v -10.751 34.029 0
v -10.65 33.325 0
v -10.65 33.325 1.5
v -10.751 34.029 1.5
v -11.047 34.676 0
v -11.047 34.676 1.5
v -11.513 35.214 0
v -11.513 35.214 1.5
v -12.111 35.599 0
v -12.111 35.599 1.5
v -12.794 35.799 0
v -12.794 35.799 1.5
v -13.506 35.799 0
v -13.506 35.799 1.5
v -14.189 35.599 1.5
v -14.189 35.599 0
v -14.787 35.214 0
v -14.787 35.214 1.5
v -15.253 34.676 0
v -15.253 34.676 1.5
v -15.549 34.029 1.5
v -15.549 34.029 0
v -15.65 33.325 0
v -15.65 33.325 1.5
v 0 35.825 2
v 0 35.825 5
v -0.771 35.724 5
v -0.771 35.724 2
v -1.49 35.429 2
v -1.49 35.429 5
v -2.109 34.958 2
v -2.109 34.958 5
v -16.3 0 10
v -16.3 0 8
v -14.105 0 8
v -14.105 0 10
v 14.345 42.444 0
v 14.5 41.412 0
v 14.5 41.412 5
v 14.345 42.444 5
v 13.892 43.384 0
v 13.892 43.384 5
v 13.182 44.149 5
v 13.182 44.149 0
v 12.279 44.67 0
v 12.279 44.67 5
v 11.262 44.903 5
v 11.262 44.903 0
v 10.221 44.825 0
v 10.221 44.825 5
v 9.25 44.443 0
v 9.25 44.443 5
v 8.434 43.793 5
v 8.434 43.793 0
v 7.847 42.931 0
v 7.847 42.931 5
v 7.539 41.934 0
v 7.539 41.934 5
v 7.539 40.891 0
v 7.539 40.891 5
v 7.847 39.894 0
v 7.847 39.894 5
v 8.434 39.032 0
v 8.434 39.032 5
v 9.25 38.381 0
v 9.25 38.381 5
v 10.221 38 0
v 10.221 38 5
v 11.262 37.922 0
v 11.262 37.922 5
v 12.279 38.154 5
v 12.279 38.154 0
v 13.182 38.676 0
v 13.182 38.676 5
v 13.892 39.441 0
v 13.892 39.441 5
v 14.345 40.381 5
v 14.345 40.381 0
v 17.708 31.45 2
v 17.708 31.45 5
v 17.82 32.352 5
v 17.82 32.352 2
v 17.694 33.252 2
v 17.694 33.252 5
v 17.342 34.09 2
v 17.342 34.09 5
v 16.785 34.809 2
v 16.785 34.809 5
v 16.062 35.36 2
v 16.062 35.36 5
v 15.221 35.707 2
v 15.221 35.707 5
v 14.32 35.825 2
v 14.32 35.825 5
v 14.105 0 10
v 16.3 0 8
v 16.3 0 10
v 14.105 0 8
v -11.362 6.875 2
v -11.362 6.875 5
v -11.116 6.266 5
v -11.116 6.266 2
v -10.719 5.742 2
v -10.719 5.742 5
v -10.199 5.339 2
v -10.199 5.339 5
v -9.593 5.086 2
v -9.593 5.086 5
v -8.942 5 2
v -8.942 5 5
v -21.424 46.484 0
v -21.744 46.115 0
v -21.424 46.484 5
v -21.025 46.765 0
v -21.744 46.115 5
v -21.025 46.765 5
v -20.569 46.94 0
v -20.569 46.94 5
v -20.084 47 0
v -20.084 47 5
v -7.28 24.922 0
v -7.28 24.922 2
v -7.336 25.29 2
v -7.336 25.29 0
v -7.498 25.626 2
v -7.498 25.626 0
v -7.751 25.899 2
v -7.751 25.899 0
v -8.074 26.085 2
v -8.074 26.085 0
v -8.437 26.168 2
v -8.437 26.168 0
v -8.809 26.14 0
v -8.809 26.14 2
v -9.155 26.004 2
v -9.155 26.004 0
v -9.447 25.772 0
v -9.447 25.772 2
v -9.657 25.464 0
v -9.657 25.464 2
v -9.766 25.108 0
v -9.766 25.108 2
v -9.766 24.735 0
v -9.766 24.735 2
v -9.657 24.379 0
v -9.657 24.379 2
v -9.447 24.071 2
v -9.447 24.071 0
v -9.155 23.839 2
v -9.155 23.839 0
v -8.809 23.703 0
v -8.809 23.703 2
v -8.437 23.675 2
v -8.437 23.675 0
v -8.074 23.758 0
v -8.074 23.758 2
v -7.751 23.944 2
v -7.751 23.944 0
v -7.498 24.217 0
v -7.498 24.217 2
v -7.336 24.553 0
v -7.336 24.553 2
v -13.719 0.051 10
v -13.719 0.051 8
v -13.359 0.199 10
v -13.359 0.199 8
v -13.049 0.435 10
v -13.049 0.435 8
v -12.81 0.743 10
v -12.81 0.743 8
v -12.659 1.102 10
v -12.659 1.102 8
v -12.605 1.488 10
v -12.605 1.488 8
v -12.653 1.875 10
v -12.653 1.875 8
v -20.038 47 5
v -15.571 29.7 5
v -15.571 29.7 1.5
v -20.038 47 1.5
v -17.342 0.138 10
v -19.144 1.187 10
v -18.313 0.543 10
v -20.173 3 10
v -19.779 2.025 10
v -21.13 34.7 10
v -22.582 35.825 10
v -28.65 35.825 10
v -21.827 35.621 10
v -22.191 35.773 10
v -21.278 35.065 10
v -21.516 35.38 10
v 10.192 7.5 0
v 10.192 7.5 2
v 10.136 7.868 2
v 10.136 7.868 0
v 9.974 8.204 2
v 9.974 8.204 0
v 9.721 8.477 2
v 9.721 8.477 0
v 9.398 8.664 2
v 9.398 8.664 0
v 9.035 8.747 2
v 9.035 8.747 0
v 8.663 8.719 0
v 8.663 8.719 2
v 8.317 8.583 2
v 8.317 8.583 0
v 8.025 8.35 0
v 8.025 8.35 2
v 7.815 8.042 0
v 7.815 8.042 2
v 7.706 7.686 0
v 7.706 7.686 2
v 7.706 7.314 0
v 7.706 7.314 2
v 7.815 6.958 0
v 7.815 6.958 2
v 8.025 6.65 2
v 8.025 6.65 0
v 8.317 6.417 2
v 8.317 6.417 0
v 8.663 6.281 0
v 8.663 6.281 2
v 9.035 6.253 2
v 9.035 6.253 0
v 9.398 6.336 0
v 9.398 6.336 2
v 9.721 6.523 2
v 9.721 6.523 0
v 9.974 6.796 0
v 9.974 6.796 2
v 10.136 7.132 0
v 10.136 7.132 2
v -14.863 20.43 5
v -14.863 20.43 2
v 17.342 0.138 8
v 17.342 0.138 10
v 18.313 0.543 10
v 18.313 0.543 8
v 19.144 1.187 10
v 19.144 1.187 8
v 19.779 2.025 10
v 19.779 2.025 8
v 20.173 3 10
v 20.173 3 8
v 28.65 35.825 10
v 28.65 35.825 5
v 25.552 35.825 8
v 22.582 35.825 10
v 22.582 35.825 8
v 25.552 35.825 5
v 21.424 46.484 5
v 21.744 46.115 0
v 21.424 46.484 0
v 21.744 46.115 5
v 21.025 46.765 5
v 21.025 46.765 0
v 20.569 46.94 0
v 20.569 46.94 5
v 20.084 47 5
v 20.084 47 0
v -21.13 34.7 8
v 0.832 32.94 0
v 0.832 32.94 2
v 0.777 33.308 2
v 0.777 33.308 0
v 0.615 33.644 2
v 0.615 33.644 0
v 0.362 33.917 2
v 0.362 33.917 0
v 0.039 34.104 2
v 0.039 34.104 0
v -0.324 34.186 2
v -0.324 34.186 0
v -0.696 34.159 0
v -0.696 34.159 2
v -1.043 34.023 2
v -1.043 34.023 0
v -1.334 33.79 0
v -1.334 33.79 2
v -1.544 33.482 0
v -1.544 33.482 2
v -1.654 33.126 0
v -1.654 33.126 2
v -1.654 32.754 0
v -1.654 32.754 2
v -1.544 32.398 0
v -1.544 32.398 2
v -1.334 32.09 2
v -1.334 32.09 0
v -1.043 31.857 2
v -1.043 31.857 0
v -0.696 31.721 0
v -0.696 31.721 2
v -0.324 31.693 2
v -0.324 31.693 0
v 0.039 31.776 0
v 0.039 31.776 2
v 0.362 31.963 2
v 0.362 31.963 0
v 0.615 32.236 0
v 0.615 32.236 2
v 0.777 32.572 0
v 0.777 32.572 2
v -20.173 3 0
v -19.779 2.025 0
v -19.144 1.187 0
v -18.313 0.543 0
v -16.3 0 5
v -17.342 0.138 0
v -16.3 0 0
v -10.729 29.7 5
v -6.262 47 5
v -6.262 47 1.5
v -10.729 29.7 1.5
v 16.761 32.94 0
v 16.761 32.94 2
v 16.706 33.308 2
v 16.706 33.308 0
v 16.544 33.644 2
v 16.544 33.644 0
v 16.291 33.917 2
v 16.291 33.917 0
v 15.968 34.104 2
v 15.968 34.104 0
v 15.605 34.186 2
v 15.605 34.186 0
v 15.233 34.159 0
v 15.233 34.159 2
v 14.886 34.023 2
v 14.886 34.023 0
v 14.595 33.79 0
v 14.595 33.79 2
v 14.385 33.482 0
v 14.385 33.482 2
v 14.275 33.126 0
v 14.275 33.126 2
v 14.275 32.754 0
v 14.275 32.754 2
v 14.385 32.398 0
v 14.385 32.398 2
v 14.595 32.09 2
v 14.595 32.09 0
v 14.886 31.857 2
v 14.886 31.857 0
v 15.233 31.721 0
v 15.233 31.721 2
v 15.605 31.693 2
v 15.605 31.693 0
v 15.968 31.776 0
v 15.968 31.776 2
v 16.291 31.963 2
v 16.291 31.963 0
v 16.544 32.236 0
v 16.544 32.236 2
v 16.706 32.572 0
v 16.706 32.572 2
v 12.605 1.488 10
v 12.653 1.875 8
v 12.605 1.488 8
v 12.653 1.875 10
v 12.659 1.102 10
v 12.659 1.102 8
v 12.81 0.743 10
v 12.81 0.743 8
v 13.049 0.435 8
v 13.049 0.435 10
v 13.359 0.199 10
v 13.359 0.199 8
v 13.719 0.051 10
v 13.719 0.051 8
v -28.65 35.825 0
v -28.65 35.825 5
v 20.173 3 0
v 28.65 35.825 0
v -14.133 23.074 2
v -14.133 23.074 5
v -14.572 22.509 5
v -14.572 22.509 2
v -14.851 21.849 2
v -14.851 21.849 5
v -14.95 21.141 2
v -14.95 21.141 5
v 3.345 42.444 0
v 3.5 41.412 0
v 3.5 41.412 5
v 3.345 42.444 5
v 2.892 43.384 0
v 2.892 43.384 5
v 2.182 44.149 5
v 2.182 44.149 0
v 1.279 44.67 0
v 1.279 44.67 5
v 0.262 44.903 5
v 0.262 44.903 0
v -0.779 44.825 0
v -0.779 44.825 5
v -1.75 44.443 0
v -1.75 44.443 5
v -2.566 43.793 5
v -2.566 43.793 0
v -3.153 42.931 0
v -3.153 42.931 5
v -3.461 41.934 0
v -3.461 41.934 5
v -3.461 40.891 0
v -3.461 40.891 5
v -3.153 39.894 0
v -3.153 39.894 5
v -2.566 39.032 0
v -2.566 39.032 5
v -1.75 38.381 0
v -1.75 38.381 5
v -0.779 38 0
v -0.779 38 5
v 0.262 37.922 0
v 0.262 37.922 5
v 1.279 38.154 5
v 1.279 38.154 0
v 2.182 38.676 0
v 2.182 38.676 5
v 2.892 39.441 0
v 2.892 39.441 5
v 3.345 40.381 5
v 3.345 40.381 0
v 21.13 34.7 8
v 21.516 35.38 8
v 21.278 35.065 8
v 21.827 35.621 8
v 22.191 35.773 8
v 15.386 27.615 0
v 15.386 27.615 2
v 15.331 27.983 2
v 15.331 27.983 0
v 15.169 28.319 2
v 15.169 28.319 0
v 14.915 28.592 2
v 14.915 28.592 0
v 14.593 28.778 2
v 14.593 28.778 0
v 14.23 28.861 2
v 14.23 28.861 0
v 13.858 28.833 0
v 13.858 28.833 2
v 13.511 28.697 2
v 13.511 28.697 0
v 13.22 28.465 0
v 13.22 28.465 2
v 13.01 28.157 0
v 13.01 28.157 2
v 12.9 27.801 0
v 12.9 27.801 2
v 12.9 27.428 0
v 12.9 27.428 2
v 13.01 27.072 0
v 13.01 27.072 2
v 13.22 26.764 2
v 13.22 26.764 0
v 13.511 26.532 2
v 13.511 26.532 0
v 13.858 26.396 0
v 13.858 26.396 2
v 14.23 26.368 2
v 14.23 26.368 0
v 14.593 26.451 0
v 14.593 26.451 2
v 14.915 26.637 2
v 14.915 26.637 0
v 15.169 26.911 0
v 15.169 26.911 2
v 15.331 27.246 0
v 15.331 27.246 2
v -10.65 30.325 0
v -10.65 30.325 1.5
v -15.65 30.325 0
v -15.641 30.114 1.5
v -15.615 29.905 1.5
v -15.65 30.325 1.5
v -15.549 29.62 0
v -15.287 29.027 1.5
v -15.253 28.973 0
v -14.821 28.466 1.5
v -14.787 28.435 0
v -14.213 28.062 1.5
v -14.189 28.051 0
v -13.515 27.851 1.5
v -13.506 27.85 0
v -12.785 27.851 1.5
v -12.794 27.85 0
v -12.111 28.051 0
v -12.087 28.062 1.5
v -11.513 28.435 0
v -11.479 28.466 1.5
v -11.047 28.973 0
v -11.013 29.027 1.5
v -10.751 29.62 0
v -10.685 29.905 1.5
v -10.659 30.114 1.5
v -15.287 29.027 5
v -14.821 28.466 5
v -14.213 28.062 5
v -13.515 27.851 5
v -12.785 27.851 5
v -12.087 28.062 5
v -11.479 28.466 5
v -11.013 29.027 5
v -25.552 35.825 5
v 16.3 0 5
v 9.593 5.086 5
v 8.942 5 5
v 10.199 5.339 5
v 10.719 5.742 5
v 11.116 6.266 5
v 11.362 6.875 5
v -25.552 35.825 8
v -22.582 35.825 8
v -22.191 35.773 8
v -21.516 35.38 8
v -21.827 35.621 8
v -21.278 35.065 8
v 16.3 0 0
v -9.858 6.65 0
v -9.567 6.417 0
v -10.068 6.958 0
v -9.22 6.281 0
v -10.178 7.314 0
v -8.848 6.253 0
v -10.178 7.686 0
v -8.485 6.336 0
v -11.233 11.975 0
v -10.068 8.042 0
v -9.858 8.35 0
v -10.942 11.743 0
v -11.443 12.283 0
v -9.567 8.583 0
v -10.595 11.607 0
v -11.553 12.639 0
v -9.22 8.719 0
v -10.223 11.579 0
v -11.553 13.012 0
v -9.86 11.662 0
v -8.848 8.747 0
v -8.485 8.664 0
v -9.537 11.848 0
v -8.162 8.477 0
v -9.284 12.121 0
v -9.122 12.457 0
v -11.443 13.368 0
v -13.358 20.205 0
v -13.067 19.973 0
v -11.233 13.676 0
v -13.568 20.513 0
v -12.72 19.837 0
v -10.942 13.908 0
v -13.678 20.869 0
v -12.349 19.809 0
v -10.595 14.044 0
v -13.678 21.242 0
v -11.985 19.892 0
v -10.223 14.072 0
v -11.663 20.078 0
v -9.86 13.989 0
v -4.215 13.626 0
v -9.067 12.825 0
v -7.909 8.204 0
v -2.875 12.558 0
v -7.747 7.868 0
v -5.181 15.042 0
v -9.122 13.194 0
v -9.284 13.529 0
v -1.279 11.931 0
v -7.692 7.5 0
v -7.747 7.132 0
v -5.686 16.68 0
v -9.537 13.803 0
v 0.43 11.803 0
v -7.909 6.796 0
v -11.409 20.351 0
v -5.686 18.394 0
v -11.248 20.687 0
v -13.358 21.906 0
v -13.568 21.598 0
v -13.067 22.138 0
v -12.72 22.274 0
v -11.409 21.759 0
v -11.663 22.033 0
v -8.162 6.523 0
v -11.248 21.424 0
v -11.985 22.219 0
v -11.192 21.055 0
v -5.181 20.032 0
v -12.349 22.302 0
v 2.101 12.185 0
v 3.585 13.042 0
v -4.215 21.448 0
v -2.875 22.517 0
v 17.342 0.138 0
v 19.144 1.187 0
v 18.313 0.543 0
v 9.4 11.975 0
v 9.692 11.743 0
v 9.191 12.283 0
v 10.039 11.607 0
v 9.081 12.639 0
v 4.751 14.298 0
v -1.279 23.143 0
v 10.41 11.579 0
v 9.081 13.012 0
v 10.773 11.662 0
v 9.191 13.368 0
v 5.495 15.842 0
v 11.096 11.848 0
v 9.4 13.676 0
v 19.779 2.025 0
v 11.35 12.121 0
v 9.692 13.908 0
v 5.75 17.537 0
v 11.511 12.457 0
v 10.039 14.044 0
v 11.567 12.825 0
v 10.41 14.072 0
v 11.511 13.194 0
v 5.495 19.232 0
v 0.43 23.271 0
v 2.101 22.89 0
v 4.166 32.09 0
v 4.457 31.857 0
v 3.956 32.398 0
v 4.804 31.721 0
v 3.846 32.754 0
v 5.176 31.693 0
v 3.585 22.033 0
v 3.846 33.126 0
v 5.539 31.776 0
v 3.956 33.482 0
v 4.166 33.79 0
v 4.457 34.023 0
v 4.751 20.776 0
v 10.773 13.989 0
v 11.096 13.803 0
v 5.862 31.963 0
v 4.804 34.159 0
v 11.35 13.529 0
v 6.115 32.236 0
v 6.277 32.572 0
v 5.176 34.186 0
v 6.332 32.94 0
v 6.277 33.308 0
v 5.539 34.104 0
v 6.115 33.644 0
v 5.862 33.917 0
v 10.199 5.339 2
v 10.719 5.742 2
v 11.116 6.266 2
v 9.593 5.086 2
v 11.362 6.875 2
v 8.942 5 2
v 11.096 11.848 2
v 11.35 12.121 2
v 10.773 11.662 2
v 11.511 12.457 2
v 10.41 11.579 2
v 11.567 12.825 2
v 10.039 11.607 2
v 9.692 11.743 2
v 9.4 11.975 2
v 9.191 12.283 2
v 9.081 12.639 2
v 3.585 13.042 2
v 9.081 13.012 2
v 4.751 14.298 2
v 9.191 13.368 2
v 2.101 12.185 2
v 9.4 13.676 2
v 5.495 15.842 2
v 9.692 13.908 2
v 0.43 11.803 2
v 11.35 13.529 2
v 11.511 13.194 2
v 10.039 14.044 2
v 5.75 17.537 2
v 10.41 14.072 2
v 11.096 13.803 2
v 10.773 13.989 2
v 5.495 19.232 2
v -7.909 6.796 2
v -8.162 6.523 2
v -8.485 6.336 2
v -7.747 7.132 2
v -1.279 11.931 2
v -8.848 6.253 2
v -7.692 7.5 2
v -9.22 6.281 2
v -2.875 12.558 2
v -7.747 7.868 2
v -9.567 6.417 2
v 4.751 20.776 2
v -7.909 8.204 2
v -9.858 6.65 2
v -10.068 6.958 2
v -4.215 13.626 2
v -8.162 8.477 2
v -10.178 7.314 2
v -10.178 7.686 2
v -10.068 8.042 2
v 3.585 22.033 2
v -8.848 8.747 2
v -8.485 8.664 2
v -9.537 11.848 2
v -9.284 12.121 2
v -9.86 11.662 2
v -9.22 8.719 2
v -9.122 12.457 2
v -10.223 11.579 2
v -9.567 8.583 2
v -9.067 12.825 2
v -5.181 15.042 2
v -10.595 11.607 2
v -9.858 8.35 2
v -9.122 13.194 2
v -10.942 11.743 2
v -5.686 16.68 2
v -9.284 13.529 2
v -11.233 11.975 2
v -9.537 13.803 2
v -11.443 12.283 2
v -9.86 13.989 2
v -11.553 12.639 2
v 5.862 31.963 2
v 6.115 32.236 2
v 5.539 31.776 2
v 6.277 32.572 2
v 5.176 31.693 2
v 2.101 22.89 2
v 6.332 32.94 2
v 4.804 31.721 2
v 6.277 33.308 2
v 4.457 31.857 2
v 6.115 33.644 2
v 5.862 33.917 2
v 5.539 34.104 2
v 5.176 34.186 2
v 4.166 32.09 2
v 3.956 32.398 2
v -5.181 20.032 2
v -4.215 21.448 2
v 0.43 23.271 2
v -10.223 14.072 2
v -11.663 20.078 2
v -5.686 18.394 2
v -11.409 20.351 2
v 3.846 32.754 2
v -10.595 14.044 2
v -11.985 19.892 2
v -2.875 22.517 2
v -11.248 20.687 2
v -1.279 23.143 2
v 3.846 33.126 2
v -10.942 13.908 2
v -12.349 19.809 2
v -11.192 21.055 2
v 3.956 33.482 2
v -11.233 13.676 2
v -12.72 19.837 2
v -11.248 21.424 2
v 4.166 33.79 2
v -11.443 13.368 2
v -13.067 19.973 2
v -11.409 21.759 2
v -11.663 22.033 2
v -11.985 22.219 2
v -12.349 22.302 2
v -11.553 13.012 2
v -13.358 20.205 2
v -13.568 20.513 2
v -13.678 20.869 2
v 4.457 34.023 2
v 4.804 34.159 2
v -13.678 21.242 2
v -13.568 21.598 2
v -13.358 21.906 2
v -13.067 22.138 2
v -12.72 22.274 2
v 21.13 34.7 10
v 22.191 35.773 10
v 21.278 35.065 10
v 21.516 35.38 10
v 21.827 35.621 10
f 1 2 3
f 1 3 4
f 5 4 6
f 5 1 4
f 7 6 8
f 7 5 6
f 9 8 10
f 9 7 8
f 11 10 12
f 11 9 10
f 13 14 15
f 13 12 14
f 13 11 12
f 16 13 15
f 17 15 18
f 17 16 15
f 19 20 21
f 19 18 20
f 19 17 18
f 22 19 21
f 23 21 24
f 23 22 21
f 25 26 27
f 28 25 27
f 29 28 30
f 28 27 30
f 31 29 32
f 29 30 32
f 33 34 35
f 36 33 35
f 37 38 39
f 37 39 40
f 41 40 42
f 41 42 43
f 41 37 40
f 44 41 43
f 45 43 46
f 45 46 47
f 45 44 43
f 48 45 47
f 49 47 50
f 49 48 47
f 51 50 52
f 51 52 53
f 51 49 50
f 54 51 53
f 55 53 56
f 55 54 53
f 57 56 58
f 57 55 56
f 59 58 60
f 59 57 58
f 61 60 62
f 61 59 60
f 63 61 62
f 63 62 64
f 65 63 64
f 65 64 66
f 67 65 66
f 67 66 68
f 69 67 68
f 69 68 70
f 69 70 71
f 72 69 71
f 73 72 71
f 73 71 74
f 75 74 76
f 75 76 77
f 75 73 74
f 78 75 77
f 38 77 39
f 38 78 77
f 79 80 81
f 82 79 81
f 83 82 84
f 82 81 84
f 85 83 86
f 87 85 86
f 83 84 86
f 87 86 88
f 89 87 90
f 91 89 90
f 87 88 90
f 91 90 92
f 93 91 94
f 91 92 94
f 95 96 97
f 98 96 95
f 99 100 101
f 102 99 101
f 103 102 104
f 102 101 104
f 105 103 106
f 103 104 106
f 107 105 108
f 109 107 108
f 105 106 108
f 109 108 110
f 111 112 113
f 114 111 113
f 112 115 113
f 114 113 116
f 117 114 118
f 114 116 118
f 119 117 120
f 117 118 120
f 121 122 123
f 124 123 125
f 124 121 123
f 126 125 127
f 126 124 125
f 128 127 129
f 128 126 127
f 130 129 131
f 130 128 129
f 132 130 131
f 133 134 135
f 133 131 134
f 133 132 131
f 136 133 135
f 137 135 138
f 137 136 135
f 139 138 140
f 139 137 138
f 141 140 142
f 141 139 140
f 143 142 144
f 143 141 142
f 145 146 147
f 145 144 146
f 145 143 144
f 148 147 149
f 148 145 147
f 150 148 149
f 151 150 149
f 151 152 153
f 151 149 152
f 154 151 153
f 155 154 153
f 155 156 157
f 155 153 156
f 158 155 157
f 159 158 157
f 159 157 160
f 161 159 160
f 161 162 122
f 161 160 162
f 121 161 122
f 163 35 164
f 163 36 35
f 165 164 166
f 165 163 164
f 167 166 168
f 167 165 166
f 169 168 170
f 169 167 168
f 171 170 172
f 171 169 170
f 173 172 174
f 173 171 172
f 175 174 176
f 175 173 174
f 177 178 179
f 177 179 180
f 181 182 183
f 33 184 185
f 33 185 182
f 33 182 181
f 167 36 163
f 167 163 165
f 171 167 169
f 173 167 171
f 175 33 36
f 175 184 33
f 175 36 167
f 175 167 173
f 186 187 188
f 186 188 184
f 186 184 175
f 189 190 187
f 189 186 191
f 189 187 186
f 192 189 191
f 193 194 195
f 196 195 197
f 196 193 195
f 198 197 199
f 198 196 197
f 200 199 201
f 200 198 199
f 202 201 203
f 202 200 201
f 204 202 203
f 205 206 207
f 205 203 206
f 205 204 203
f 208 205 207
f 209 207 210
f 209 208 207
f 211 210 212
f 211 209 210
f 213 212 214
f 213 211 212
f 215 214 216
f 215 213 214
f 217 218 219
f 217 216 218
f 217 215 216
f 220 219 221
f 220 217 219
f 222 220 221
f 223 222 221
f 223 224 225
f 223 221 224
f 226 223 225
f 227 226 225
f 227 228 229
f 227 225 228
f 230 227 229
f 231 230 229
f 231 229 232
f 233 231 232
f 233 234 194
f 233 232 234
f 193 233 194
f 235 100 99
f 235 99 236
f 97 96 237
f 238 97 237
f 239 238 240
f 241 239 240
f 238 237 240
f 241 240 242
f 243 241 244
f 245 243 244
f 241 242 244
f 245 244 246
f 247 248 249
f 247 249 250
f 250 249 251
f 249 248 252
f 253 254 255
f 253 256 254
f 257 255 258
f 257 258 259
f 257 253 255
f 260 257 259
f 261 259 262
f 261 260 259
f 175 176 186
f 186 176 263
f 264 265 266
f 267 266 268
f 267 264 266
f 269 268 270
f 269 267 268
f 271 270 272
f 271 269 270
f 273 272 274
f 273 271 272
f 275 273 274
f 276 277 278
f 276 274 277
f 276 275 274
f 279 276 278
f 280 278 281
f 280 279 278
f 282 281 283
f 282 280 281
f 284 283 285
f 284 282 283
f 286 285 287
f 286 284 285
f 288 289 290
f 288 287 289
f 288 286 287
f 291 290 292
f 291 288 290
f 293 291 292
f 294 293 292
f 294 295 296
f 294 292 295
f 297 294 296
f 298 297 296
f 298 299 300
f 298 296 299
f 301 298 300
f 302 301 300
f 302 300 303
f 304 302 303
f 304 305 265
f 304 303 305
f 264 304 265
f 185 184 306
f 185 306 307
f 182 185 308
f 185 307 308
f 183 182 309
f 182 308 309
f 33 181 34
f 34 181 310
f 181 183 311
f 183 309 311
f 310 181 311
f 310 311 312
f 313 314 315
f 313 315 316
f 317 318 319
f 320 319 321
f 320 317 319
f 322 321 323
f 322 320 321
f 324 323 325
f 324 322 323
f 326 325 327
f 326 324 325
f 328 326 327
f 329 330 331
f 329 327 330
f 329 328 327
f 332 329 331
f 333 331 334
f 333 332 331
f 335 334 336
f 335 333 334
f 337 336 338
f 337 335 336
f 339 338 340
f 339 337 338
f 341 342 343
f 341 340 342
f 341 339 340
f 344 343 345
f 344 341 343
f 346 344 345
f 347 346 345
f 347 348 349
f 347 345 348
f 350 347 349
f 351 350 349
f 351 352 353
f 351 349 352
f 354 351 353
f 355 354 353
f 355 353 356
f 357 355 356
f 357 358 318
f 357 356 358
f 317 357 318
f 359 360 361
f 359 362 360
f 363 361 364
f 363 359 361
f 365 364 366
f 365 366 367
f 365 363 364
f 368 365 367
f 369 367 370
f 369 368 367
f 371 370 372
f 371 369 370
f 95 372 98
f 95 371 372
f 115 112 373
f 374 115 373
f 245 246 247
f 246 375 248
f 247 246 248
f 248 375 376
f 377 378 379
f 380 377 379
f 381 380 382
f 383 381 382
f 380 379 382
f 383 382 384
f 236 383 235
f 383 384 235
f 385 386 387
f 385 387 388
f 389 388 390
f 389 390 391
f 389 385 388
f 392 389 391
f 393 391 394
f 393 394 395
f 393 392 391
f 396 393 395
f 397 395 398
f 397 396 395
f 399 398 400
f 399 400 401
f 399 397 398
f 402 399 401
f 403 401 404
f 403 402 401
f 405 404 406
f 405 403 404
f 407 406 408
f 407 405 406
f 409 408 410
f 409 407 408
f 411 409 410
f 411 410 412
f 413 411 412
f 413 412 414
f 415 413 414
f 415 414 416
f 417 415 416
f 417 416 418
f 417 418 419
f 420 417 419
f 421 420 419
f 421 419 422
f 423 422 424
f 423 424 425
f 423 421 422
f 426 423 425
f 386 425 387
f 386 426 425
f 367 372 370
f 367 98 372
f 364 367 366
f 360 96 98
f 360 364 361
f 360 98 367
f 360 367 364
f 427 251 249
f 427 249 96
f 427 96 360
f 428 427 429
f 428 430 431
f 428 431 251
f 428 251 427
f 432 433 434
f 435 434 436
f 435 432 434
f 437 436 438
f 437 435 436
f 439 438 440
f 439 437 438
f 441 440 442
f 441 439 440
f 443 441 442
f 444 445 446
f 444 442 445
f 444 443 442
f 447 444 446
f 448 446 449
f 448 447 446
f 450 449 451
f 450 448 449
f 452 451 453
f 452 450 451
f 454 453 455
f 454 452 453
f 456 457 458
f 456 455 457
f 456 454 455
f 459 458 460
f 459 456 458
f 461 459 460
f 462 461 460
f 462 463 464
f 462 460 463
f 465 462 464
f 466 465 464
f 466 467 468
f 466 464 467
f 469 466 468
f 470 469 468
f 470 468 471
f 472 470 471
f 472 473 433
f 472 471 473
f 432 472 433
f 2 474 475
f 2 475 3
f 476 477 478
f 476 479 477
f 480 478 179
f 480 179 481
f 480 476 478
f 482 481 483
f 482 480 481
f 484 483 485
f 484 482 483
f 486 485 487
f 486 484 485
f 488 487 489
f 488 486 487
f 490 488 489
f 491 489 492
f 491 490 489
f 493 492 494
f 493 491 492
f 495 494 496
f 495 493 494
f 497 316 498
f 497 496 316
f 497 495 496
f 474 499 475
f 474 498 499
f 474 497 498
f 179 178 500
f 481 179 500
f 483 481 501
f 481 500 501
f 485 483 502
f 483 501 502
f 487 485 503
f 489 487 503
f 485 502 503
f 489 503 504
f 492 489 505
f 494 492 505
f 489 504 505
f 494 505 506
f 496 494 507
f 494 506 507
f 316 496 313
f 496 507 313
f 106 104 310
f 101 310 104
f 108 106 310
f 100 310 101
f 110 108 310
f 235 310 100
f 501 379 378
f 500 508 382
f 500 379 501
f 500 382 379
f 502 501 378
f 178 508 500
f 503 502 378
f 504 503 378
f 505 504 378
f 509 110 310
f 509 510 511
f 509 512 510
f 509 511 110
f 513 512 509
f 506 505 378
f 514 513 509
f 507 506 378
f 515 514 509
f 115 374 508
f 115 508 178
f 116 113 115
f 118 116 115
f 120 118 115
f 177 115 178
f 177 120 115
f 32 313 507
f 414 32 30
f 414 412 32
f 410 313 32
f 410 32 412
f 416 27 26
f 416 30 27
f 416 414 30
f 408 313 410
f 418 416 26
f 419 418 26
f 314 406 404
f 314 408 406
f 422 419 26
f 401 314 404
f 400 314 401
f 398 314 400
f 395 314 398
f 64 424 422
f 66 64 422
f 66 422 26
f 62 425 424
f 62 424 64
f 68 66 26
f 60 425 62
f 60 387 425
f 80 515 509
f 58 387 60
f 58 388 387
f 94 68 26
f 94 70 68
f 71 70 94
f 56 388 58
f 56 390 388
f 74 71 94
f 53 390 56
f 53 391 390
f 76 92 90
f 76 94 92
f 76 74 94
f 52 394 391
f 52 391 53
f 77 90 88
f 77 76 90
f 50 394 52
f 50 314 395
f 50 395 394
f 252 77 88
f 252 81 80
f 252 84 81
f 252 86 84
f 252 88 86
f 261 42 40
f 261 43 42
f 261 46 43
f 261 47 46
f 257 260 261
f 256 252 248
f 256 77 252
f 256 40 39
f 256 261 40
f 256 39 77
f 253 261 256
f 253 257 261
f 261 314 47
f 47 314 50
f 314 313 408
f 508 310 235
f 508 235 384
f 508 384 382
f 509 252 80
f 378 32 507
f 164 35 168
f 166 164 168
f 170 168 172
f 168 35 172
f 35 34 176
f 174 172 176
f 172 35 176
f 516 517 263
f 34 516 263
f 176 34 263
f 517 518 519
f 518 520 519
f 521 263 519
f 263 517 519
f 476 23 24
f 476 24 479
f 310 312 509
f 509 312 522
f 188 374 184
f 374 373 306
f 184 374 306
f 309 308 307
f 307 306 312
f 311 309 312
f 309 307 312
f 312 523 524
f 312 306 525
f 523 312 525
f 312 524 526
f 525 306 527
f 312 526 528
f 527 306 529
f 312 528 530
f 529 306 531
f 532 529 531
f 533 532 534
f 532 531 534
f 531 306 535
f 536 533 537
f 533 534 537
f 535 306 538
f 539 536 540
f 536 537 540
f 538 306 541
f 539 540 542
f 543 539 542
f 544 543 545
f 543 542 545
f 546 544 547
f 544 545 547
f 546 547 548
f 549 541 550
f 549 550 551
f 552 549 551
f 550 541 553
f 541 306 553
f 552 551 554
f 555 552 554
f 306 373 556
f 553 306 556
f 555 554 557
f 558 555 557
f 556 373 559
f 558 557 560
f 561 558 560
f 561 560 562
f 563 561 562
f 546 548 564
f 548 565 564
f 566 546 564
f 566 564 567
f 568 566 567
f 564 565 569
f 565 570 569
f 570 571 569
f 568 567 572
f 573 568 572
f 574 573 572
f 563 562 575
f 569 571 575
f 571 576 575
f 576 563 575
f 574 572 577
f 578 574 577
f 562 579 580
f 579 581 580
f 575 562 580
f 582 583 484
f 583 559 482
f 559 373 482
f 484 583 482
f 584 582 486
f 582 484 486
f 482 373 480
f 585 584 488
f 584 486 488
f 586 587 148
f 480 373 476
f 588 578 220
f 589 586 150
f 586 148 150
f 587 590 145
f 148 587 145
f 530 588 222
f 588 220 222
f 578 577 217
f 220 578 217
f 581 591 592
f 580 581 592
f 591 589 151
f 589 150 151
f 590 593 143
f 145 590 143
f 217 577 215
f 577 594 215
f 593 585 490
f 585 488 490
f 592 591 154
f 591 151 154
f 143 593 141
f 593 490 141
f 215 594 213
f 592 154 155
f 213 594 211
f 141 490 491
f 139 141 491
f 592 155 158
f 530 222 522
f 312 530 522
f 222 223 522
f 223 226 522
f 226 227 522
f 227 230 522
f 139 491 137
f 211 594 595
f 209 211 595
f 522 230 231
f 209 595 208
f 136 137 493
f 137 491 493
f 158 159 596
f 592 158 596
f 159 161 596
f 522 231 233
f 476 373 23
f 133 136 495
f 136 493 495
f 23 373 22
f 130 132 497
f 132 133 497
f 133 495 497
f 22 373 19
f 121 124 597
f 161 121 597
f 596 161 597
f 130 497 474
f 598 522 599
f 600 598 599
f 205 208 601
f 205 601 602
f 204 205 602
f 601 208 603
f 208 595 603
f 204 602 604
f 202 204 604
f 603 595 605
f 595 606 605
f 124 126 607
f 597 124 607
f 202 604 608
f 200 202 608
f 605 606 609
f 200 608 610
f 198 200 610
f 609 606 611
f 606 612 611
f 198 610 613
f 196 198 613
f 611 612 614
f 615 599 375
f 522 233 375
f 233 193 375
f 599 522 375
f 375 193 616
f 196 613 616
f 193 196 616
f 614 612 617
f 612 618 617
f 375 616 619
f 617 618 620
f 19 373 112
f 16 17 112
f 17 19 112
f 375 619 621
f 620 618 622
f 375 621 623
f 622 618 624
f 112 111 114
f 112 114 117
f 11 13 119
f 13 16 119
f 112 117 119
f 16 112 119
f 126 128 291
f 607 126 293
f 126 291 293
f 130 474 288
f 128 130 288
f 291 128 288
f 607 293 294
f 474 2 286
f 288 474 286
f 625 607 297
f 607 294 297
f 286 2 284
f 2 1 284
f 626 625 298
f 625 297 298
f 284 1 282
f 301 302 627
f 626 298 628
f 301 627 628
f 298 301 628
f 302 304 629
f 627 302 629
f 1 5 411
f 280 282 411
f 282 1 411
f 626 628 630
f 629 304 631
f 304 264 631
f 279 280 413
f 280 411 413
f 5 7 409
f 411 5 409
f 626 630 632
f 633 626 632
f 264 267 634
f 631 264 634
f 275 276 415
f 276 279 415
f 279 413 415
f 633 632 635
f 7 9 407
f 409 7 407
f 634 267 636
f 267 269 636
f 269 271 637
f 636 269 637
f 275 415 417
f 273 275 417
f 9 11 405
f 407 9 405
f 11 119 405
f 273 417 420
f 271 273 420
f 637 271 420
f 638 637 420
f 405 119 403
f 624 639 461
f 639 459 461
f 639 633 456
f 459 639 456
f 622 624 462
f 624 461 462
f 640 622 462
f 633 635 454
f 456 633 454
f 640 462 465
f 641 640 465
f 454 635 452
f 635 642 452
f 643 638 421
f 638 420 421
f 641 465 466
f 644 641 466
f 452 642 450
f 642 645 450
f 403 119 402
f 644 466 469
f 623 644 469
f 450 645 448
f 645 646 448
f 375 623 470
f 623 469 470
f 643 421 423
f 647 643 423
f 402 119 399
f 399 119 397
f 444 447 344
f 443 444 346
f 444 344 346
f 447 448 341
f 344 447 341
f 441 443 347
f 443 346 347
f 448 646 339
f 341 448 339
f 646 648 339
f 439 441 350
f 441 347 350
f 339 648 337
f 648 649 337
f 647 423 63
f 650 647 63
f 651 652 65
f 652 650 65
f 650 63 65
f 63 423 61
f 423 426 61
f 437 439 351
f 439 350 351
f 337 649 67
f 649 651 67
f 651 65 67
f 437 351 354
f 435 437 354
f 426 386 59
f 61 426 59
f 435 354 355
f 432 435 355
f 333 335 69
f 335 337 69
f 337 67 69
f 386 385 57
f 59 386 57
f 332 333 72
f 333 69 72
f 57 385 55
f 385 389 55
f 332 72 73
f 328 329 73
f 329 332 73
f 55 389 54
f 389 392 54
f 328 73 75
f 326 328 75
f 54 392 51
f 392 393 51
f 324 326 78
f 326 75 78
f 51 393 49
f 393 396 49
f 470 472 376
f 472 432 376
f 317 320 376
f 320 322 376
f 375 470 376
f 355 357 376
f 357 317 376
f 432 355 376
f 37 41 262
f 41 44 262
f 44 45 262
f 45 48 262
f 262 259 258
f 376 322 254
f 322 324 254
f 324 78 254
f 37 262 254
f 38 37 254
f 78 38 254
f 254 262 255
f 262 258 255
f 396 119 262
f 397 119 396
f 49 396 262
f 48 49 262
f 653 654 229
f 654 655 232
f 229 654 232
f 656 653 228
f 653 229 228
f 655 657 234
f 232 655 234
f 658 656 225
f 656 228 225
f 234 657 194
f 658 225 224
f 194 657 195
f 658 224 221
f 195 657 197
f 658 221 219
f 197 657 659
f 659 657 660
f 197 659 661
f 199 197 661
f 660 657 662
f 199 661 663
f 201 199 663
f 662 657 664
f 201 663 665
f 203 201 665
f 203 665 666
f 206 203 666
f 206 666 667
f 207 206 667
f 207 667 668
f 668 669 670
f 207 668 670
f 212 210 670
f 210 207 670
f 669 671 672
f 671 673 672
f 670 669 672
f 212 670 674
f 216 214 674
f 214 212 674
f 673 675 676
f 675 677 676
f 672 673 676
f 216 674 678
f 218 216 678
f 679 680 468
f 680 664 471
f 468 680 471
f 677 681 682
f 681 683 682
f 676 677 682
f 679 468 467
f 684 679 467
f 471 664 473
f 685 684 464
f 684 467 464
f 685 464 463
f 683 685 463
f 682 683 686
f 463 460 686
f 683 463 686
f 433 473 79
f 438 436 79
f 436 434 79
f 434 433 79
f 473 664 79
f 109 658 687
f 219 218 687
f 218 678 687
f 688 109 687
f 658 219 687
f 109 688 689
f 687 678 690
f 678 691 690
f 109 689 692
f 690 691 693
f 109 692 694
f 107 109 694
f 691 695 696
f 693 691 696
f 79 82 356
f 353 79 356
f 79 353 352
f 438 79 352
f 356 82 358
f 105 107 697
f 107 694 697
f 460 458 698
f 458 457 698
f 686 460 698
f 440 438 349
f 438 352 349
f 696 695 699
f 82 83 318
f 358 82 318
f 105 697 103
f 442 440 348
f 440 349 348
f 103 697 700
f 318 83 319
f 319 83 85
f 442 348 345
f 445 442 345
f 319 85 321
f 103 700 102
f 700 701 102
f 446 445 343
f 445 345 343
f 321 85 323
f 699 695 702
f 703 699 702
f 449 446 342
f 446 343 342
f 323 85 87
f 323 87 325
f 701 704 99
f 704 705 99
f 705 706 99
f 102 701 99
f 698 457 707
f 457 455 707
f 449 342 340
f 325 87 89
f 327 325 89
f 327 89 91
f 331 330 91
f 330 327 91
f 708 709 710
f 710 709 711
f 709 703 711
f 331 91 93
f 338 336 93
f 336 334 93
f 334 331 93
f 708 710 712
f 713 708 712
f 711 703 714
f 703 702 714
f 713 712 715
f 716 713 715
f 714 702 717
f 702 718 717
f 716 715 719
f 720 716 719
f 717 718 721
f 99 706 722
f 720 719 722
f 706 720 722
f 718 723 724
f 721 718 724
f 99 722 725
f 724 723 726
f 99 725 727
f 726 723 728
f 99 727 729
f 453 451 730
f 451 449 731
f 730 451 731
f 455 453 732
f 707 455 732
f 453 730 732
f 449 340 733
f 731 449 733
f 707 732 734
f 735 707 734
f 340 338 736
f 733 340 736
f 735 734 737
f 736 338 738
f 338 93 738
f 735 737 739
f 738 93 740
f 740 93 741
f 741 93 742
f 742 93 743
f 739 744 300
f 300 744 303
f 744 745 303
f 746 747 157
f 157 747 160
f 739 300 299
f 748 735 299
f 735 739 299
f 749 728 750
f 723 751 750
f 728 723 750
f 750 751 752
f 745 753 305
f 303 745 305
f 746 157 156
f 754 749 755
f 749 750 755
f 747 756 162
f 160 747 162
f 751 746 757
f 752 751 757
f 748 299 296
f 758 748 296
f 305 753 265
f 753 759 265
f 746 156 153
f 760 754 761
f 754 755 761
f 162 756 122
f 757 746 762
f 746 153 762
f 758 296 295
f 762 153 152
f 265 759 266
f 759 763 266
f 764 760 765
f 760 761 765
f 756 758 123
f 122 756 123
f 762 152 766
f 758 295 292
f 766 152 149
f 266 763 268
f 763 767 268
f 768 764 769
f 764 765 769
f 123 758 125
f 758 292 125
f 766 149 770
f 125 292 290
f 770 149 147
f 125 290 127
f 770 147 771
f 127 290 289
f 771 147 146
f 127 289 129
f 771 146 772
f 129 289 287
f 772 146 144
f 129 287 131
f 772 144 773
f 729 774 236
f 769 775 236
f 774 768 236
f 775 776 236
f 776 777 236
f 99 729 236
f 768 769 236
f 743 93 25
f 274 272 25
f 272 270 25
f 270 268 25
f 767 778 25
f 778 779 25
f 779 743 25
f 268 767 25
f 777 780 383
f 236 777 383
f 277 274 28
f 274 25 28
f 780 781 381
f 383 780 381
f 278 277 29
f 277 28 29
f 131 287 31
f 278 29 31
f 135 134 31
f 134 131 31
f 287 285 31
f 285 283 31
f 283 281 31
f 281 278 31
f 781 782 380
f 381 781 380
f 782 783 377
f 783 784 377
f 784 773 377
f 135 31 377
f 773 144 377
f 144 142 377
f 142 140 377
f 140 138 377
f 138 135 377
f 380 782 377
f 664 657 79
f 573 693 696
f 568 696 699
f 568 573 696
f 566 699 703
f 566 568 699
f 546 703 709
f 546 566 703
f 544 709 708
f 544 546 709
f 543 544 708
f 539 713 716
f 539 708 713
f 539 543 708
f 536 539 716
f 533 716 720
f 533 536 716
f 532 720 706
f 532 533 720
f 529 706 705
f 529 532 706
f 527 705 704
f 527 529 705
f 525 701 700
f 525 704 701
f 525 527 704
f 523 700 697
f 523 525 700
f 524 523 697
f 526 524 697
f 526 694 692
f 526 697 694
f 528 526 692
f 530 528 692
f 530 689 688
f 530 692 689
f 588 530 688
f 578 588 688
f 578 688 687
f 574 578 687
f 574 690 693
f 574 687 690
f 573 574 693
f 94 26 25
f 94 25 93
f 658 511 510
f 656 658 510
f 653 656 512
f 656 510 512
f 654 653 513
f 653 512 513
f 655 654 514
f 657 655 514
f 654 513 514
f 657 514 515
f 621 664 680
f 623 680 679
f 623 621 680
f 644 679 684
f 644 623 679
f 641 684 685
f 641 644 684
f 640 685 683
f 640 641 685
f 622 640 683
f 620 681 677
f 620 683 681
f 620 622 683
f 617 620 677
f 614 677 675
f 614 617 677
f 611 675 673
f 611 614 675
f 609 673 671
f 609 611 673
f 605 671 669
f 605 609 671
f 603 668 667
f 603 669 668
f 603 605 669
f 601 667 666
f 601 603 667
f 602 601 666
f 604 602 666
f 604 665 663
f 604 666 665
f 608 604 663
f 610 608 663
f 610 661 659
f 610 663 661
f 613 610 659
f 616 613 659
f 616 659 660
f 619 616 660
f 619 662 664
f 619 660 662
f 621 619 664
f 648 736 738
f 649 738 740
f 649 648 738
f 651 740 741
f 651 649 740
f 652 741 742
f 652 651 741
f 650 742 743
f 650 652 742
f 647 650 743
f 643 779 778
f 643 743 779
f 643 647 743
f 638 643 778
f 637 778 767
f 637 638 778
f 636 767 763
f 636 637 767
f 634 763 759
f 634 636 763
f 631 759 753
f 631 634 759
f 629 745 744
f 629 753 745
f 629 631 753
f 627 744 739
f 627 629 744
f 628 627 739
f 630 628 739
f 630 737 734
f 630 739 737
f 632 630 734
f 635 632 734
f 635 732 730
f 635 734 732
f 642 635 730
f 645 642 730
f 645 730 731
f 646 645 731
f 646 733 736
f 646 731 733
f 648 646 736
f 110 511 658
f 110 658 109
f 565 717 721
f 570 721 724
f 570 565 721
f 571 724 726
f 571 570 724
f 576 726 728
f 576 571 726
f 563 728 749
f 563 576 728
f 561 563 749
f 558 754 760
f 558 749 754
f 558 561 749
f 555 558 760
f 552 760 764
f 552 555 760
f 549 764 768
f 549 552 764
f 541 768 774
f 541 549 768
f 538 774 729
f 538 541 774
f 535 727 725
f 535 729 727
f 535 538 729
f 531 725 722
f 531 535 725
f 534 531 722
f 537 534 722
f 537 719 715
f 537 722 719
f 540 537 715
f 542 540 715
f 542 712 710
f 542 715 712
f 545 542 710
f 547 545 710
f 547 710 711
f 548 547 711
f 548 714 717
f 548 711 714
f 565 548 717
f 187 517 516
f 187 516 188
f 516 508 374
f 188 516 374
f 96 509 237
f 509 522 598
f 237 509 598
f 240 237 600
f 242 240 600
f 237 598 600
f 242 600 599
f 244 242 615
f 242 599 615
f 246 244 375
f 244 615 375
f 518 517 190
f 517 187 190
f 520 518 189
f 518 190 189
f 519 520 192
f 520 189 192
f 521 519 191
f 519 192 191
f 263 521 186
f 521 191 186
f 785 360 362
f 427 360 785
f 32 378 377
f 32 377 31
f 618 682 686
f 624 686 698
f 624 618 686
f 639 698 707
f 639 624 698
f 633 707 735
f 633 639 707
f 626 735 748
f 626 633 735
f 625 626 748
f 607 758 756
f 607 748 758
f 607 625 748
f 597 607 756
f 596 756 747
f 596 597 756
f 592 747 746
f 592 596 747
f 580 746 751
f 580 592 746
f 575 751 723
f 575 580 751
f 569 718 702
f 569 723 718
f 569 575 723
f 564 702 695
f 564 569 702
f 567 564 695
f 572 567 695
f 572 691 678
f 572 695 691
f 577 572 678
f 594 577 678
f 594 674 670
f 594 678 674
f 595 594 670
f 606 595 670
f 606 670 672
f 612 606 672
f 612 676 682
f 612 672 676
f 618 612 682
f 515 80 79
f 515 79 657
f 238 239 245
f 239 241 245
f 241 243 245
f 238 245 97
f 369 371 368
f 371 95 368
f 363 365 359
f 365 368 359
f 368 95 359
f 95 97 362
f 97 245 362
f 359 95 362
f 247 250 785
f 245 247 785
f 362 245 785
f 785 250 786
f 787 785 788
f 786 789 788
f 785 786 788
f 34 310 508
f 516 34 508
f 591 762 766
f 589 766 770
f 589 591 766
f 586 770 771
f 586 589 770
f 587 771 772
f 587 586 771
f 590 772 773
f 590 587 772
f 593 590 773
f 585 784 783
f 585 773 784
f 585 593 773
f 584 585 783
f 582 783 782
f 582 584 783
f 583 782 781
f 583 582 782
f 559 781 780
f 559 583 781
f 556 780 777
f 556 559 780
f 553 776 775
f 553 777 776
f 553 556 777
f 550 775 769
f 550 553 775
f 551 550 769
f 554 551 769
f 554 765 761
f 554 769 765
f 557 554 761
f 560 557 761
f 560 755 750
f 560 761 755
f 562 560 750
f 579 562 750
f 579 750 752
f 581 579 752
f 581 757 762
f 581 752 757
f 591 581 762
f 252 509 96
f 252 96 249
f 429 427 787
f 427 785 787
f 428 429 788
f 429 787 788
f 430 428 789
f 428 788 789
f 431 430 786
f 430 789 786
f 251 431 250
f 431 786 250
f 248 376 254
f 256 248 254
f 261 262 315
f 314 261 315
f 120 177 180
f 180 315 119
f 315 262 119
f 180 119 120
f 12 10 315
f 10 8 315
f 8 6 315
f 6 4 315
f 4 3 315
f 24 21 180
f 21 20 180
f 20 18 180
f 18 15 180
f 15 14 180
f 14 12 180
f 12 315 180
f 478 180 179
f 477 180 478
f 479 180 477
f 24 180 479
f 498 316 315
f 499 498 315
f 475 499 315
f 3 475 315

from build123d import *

# Parameters (mm, degrees)
SKETCH001_R     = 5.75
SKETCH001_R_2   = 3.5
SKETCH001_R_3   = 1.25
PAD_DEPTH       = 5
PAD001_DEPTH    = 8
PAD002_DEPTH    = 2
FILLET_R        = 1.5
POCKET_DEPTH    = 3
POCKET001_DEPTH = 3.5
FILLET001_R     = 2


with BuildPart() as part:
    # Sketch001 → Pad (new body)
    with BuildSketch(Plane.XY):
        with BuildLine():
            Line((-21.15, 47), (-28.65, 35.824688))
            Line((-28.65, 35.824688), (-20.173115, 2.999829))
            ThreePointArc((-20.173115, 2.999829), (-18.749596, 0.837668), (-16.300176, 0))
            Line((-16.300176, 0), (16.300176, 0))
            ThreePointArc((16.300176, 0), (18.749596, 0.837668), (20.173115, 2.999829))
            Line((20.173115, 2.999829), (28.65, 35.824688))
            Line((28.65, 35.824688), (21.15, 47))
            Line((21.15, 47), (-21.15, 47))
        make_face()
        with Locations((0, 17.53728)):
            Circle(SKETCH001_R, mode=Mode.SUBTRACT)
        with Locations((0, 41.412344)):
            Circle(SKETCH001_R_2, mode=Mode.SUBTRACT)
        with Locations((11, 41.412344)):
            Circle(SKETCH001_R_2, mode=Mode.SUBTRACT)
        with Locations((-8.941578, 7.5)):
            Circle(SKETCH001_R_3, mode=Mode.SUBTRACT)
        with Locations((-10.316813, 12.825292)):
            Circle(SKETCH001_R_3, mode=Mode.SUBTRACT)
        with Locations((-12.442175, 21.055288)):
            Circle(SKETCH001_R_3, mode=Mode.SUBTRACT)
        with Locations((-8.530434, 24.921588)):
            Circle(SKETCH001_R_3, mode=Mode.SUBTRACT)
        with Locations((8.941578, 7.5)):
            Circle(SKETCH001_R_3, mode=Mode.SUBTRACT)
        with Locations((10.316813, 12.825292)):
            Circle(SKETCH001_R_3, mode=Mode.SUBTRACT)
        with Locations((14.136115, 27.614693)):
            Circle(SKETCH001_R_3, mode=Mode.SUBTRACT)
        with Locations((15.511349, 32.939984)):
            Circle(SKETCH001_R_3, mode=Mode.SUBTRACT)
        with Locations((5.0822, 32.939984)):
            Circle(SKETCH001_R_3, mode=Mode.SUBTRACT)
        with Locations((-0.4178, 32.939984)):
            Circle(SKETCH001_R_3, mode=Mode.SUBTRACT)
        with BuildLine():
            ThreePointArc((-10.65, 33.324688), (-13.15, 35.824688), (-15.65, 33.324688))
            Line((-15.65, 33.324688), (-15.65, 30.324688))
            ThreePointArc((-15.65, 30.324688), (-13.15, 27.824688), (-10.65, 30.324688))
            Line((-10.65, 30.324688), (-10.65, 33.324688))
        make_face(mode=Mode.SUBTRACT)
    extrude(amount=PAD_DEPTH)

    # Sketch002 → Pad001 (join)
    with BuildSketch(Plane.XY):
        with BuildLine():
            Line((-25.551578, 35.824688), (-28.65, 35.824688))
            Line((-28.65, 35.824688), (-20.173115, 2.999829))
            ThreePointArc((-20.173115, 2.999829), (-18.749596, 0.837668), (-16.300176, 0))
            Line((-16.300176, 0), (-25.551578, 35.824688))
        make_face()
        with BuildLine():
            Line((28.65, 35.824688), (25.551578, 35.824688))
            Line((16.3, 0), (25.551578, 35.824688))
            ThreePointArc((16.3, 0), (18.749527, 0.837614), (20.173115, 2.999829))
            Line((28.65, 35.824688), (20.173115, 2.999829))
        make_face()
    extrude(amount=PAD001_DEPTH)

    # Sketch003 → Pad002 (join)
    with BuildSketch(Plane.XY.offset(8)):
        with BuildLine():
            Line((-16.300176, 0), (-12.168771, 0))
            Line((-12.168771, 0), (-21.420349, 35.824688))
            Line((-21.420349, 35.824688), (-28.65, 35.824688))
            Line((-28.65, 35.824688), (-20.173115, 2.999829))
            ThreePointArc((-20.173115, 2.999829), (-18.749596, 0.837668), (-16.300176, 0))
        make_face()
        with BuildLine():
            Line((16.300176, 0), (12.168771, 0))
            Line((12.168771, 0), (21.420349, 35.824688))
            Line((21.420349, 35.824688), (28.65, 35.824688))
            Line((28.65, 35.824688), (20.173115, 2.999829))
            ThreePointArc((16.300176, 0), (18.749596, 0.837668), (20.173115, 2.999829))
        make_face()
    extrude(amount=PAD002_DEPTH)

    # Fillet
    fillet_edges = [part.edges().sort_by_distance(p)[0] for p in [
        (-12.168771, 0, 9),
        (12.168771, 0, 9),
        (-21.420349, 35.824688, 9),
        (21.420349, 35.824688, 9),
    ]]
    fillet(fillet_edges, radius=FILLET_R)

    # Sketch004 (on DatumPlane) → Pocket (cut)
    with BuildSketch(Plane.XY.offset(5)):
        with BuildLine():
            Line((-11.362165, 6.874893), (-14.862762, 20.430181))
            ThreePointArc((-14.133267, 23.073669), (-14.85103, 21.849343), (-14.862762, 20.430181))
            Line((-14.133267, 23.073669), (-2.108891, 34.958365))
            ThreePointArc((0, 35.824688), (-1.139949, 35.599669), (-2.108891, 34.958365))
            Line((0, 35.824688), (14.319644, 35.824688))
            ThreePointArc((17.708466, 31.449539), (17.086685, 34.467931), (14.319644, 35.824688))
            Line((17.708466, 31.449539), (11.362165, 6.874893))
            ThreePointArc((8.941578, 5), (10.472466, 5.523543), (11.362165, 6.874893))
            Line((8.941578, 5), (-8.941578, 5))
            ThreePointArc((-11.362165, 6.874893), (-10.472466, 5.523543), (-8.941578, 5))
        make_face()
    extrude(amount=-POCKET_DEPTH, mode=Mode.SUBTRACT)

    # Sketch005 (on DatumPlane) → Pocket001 (cut)
    with BuildSketch(Plane.XY.offset(5)):
        with BuildLine():
            Line((-6.261651, 47), (-10.729413, 29.699582))
            ThreePointArc((-15.570587, 29.699582), (-13.15, 27.824688), (-10.729413, 29.699582))
            Line((-15.570587, 29.699582), (-20.038349, 47))
            Line((-20.038349, 47), (-6.261651, 47))
        make_face()
    extrude(amount=-POCKET001_DEPTH, mode=Mode.SUBTRACT)

    # Fillet001
    fillet001_edges = [part.edges().sort_by_distance(p)[0] for p in [
        (-21.15, 47, 2.5),
        (21.15, 47, 2.5),
    ]]
    fillet(fillet001_edges, radius=FILLET001_R)


solid = part.part
